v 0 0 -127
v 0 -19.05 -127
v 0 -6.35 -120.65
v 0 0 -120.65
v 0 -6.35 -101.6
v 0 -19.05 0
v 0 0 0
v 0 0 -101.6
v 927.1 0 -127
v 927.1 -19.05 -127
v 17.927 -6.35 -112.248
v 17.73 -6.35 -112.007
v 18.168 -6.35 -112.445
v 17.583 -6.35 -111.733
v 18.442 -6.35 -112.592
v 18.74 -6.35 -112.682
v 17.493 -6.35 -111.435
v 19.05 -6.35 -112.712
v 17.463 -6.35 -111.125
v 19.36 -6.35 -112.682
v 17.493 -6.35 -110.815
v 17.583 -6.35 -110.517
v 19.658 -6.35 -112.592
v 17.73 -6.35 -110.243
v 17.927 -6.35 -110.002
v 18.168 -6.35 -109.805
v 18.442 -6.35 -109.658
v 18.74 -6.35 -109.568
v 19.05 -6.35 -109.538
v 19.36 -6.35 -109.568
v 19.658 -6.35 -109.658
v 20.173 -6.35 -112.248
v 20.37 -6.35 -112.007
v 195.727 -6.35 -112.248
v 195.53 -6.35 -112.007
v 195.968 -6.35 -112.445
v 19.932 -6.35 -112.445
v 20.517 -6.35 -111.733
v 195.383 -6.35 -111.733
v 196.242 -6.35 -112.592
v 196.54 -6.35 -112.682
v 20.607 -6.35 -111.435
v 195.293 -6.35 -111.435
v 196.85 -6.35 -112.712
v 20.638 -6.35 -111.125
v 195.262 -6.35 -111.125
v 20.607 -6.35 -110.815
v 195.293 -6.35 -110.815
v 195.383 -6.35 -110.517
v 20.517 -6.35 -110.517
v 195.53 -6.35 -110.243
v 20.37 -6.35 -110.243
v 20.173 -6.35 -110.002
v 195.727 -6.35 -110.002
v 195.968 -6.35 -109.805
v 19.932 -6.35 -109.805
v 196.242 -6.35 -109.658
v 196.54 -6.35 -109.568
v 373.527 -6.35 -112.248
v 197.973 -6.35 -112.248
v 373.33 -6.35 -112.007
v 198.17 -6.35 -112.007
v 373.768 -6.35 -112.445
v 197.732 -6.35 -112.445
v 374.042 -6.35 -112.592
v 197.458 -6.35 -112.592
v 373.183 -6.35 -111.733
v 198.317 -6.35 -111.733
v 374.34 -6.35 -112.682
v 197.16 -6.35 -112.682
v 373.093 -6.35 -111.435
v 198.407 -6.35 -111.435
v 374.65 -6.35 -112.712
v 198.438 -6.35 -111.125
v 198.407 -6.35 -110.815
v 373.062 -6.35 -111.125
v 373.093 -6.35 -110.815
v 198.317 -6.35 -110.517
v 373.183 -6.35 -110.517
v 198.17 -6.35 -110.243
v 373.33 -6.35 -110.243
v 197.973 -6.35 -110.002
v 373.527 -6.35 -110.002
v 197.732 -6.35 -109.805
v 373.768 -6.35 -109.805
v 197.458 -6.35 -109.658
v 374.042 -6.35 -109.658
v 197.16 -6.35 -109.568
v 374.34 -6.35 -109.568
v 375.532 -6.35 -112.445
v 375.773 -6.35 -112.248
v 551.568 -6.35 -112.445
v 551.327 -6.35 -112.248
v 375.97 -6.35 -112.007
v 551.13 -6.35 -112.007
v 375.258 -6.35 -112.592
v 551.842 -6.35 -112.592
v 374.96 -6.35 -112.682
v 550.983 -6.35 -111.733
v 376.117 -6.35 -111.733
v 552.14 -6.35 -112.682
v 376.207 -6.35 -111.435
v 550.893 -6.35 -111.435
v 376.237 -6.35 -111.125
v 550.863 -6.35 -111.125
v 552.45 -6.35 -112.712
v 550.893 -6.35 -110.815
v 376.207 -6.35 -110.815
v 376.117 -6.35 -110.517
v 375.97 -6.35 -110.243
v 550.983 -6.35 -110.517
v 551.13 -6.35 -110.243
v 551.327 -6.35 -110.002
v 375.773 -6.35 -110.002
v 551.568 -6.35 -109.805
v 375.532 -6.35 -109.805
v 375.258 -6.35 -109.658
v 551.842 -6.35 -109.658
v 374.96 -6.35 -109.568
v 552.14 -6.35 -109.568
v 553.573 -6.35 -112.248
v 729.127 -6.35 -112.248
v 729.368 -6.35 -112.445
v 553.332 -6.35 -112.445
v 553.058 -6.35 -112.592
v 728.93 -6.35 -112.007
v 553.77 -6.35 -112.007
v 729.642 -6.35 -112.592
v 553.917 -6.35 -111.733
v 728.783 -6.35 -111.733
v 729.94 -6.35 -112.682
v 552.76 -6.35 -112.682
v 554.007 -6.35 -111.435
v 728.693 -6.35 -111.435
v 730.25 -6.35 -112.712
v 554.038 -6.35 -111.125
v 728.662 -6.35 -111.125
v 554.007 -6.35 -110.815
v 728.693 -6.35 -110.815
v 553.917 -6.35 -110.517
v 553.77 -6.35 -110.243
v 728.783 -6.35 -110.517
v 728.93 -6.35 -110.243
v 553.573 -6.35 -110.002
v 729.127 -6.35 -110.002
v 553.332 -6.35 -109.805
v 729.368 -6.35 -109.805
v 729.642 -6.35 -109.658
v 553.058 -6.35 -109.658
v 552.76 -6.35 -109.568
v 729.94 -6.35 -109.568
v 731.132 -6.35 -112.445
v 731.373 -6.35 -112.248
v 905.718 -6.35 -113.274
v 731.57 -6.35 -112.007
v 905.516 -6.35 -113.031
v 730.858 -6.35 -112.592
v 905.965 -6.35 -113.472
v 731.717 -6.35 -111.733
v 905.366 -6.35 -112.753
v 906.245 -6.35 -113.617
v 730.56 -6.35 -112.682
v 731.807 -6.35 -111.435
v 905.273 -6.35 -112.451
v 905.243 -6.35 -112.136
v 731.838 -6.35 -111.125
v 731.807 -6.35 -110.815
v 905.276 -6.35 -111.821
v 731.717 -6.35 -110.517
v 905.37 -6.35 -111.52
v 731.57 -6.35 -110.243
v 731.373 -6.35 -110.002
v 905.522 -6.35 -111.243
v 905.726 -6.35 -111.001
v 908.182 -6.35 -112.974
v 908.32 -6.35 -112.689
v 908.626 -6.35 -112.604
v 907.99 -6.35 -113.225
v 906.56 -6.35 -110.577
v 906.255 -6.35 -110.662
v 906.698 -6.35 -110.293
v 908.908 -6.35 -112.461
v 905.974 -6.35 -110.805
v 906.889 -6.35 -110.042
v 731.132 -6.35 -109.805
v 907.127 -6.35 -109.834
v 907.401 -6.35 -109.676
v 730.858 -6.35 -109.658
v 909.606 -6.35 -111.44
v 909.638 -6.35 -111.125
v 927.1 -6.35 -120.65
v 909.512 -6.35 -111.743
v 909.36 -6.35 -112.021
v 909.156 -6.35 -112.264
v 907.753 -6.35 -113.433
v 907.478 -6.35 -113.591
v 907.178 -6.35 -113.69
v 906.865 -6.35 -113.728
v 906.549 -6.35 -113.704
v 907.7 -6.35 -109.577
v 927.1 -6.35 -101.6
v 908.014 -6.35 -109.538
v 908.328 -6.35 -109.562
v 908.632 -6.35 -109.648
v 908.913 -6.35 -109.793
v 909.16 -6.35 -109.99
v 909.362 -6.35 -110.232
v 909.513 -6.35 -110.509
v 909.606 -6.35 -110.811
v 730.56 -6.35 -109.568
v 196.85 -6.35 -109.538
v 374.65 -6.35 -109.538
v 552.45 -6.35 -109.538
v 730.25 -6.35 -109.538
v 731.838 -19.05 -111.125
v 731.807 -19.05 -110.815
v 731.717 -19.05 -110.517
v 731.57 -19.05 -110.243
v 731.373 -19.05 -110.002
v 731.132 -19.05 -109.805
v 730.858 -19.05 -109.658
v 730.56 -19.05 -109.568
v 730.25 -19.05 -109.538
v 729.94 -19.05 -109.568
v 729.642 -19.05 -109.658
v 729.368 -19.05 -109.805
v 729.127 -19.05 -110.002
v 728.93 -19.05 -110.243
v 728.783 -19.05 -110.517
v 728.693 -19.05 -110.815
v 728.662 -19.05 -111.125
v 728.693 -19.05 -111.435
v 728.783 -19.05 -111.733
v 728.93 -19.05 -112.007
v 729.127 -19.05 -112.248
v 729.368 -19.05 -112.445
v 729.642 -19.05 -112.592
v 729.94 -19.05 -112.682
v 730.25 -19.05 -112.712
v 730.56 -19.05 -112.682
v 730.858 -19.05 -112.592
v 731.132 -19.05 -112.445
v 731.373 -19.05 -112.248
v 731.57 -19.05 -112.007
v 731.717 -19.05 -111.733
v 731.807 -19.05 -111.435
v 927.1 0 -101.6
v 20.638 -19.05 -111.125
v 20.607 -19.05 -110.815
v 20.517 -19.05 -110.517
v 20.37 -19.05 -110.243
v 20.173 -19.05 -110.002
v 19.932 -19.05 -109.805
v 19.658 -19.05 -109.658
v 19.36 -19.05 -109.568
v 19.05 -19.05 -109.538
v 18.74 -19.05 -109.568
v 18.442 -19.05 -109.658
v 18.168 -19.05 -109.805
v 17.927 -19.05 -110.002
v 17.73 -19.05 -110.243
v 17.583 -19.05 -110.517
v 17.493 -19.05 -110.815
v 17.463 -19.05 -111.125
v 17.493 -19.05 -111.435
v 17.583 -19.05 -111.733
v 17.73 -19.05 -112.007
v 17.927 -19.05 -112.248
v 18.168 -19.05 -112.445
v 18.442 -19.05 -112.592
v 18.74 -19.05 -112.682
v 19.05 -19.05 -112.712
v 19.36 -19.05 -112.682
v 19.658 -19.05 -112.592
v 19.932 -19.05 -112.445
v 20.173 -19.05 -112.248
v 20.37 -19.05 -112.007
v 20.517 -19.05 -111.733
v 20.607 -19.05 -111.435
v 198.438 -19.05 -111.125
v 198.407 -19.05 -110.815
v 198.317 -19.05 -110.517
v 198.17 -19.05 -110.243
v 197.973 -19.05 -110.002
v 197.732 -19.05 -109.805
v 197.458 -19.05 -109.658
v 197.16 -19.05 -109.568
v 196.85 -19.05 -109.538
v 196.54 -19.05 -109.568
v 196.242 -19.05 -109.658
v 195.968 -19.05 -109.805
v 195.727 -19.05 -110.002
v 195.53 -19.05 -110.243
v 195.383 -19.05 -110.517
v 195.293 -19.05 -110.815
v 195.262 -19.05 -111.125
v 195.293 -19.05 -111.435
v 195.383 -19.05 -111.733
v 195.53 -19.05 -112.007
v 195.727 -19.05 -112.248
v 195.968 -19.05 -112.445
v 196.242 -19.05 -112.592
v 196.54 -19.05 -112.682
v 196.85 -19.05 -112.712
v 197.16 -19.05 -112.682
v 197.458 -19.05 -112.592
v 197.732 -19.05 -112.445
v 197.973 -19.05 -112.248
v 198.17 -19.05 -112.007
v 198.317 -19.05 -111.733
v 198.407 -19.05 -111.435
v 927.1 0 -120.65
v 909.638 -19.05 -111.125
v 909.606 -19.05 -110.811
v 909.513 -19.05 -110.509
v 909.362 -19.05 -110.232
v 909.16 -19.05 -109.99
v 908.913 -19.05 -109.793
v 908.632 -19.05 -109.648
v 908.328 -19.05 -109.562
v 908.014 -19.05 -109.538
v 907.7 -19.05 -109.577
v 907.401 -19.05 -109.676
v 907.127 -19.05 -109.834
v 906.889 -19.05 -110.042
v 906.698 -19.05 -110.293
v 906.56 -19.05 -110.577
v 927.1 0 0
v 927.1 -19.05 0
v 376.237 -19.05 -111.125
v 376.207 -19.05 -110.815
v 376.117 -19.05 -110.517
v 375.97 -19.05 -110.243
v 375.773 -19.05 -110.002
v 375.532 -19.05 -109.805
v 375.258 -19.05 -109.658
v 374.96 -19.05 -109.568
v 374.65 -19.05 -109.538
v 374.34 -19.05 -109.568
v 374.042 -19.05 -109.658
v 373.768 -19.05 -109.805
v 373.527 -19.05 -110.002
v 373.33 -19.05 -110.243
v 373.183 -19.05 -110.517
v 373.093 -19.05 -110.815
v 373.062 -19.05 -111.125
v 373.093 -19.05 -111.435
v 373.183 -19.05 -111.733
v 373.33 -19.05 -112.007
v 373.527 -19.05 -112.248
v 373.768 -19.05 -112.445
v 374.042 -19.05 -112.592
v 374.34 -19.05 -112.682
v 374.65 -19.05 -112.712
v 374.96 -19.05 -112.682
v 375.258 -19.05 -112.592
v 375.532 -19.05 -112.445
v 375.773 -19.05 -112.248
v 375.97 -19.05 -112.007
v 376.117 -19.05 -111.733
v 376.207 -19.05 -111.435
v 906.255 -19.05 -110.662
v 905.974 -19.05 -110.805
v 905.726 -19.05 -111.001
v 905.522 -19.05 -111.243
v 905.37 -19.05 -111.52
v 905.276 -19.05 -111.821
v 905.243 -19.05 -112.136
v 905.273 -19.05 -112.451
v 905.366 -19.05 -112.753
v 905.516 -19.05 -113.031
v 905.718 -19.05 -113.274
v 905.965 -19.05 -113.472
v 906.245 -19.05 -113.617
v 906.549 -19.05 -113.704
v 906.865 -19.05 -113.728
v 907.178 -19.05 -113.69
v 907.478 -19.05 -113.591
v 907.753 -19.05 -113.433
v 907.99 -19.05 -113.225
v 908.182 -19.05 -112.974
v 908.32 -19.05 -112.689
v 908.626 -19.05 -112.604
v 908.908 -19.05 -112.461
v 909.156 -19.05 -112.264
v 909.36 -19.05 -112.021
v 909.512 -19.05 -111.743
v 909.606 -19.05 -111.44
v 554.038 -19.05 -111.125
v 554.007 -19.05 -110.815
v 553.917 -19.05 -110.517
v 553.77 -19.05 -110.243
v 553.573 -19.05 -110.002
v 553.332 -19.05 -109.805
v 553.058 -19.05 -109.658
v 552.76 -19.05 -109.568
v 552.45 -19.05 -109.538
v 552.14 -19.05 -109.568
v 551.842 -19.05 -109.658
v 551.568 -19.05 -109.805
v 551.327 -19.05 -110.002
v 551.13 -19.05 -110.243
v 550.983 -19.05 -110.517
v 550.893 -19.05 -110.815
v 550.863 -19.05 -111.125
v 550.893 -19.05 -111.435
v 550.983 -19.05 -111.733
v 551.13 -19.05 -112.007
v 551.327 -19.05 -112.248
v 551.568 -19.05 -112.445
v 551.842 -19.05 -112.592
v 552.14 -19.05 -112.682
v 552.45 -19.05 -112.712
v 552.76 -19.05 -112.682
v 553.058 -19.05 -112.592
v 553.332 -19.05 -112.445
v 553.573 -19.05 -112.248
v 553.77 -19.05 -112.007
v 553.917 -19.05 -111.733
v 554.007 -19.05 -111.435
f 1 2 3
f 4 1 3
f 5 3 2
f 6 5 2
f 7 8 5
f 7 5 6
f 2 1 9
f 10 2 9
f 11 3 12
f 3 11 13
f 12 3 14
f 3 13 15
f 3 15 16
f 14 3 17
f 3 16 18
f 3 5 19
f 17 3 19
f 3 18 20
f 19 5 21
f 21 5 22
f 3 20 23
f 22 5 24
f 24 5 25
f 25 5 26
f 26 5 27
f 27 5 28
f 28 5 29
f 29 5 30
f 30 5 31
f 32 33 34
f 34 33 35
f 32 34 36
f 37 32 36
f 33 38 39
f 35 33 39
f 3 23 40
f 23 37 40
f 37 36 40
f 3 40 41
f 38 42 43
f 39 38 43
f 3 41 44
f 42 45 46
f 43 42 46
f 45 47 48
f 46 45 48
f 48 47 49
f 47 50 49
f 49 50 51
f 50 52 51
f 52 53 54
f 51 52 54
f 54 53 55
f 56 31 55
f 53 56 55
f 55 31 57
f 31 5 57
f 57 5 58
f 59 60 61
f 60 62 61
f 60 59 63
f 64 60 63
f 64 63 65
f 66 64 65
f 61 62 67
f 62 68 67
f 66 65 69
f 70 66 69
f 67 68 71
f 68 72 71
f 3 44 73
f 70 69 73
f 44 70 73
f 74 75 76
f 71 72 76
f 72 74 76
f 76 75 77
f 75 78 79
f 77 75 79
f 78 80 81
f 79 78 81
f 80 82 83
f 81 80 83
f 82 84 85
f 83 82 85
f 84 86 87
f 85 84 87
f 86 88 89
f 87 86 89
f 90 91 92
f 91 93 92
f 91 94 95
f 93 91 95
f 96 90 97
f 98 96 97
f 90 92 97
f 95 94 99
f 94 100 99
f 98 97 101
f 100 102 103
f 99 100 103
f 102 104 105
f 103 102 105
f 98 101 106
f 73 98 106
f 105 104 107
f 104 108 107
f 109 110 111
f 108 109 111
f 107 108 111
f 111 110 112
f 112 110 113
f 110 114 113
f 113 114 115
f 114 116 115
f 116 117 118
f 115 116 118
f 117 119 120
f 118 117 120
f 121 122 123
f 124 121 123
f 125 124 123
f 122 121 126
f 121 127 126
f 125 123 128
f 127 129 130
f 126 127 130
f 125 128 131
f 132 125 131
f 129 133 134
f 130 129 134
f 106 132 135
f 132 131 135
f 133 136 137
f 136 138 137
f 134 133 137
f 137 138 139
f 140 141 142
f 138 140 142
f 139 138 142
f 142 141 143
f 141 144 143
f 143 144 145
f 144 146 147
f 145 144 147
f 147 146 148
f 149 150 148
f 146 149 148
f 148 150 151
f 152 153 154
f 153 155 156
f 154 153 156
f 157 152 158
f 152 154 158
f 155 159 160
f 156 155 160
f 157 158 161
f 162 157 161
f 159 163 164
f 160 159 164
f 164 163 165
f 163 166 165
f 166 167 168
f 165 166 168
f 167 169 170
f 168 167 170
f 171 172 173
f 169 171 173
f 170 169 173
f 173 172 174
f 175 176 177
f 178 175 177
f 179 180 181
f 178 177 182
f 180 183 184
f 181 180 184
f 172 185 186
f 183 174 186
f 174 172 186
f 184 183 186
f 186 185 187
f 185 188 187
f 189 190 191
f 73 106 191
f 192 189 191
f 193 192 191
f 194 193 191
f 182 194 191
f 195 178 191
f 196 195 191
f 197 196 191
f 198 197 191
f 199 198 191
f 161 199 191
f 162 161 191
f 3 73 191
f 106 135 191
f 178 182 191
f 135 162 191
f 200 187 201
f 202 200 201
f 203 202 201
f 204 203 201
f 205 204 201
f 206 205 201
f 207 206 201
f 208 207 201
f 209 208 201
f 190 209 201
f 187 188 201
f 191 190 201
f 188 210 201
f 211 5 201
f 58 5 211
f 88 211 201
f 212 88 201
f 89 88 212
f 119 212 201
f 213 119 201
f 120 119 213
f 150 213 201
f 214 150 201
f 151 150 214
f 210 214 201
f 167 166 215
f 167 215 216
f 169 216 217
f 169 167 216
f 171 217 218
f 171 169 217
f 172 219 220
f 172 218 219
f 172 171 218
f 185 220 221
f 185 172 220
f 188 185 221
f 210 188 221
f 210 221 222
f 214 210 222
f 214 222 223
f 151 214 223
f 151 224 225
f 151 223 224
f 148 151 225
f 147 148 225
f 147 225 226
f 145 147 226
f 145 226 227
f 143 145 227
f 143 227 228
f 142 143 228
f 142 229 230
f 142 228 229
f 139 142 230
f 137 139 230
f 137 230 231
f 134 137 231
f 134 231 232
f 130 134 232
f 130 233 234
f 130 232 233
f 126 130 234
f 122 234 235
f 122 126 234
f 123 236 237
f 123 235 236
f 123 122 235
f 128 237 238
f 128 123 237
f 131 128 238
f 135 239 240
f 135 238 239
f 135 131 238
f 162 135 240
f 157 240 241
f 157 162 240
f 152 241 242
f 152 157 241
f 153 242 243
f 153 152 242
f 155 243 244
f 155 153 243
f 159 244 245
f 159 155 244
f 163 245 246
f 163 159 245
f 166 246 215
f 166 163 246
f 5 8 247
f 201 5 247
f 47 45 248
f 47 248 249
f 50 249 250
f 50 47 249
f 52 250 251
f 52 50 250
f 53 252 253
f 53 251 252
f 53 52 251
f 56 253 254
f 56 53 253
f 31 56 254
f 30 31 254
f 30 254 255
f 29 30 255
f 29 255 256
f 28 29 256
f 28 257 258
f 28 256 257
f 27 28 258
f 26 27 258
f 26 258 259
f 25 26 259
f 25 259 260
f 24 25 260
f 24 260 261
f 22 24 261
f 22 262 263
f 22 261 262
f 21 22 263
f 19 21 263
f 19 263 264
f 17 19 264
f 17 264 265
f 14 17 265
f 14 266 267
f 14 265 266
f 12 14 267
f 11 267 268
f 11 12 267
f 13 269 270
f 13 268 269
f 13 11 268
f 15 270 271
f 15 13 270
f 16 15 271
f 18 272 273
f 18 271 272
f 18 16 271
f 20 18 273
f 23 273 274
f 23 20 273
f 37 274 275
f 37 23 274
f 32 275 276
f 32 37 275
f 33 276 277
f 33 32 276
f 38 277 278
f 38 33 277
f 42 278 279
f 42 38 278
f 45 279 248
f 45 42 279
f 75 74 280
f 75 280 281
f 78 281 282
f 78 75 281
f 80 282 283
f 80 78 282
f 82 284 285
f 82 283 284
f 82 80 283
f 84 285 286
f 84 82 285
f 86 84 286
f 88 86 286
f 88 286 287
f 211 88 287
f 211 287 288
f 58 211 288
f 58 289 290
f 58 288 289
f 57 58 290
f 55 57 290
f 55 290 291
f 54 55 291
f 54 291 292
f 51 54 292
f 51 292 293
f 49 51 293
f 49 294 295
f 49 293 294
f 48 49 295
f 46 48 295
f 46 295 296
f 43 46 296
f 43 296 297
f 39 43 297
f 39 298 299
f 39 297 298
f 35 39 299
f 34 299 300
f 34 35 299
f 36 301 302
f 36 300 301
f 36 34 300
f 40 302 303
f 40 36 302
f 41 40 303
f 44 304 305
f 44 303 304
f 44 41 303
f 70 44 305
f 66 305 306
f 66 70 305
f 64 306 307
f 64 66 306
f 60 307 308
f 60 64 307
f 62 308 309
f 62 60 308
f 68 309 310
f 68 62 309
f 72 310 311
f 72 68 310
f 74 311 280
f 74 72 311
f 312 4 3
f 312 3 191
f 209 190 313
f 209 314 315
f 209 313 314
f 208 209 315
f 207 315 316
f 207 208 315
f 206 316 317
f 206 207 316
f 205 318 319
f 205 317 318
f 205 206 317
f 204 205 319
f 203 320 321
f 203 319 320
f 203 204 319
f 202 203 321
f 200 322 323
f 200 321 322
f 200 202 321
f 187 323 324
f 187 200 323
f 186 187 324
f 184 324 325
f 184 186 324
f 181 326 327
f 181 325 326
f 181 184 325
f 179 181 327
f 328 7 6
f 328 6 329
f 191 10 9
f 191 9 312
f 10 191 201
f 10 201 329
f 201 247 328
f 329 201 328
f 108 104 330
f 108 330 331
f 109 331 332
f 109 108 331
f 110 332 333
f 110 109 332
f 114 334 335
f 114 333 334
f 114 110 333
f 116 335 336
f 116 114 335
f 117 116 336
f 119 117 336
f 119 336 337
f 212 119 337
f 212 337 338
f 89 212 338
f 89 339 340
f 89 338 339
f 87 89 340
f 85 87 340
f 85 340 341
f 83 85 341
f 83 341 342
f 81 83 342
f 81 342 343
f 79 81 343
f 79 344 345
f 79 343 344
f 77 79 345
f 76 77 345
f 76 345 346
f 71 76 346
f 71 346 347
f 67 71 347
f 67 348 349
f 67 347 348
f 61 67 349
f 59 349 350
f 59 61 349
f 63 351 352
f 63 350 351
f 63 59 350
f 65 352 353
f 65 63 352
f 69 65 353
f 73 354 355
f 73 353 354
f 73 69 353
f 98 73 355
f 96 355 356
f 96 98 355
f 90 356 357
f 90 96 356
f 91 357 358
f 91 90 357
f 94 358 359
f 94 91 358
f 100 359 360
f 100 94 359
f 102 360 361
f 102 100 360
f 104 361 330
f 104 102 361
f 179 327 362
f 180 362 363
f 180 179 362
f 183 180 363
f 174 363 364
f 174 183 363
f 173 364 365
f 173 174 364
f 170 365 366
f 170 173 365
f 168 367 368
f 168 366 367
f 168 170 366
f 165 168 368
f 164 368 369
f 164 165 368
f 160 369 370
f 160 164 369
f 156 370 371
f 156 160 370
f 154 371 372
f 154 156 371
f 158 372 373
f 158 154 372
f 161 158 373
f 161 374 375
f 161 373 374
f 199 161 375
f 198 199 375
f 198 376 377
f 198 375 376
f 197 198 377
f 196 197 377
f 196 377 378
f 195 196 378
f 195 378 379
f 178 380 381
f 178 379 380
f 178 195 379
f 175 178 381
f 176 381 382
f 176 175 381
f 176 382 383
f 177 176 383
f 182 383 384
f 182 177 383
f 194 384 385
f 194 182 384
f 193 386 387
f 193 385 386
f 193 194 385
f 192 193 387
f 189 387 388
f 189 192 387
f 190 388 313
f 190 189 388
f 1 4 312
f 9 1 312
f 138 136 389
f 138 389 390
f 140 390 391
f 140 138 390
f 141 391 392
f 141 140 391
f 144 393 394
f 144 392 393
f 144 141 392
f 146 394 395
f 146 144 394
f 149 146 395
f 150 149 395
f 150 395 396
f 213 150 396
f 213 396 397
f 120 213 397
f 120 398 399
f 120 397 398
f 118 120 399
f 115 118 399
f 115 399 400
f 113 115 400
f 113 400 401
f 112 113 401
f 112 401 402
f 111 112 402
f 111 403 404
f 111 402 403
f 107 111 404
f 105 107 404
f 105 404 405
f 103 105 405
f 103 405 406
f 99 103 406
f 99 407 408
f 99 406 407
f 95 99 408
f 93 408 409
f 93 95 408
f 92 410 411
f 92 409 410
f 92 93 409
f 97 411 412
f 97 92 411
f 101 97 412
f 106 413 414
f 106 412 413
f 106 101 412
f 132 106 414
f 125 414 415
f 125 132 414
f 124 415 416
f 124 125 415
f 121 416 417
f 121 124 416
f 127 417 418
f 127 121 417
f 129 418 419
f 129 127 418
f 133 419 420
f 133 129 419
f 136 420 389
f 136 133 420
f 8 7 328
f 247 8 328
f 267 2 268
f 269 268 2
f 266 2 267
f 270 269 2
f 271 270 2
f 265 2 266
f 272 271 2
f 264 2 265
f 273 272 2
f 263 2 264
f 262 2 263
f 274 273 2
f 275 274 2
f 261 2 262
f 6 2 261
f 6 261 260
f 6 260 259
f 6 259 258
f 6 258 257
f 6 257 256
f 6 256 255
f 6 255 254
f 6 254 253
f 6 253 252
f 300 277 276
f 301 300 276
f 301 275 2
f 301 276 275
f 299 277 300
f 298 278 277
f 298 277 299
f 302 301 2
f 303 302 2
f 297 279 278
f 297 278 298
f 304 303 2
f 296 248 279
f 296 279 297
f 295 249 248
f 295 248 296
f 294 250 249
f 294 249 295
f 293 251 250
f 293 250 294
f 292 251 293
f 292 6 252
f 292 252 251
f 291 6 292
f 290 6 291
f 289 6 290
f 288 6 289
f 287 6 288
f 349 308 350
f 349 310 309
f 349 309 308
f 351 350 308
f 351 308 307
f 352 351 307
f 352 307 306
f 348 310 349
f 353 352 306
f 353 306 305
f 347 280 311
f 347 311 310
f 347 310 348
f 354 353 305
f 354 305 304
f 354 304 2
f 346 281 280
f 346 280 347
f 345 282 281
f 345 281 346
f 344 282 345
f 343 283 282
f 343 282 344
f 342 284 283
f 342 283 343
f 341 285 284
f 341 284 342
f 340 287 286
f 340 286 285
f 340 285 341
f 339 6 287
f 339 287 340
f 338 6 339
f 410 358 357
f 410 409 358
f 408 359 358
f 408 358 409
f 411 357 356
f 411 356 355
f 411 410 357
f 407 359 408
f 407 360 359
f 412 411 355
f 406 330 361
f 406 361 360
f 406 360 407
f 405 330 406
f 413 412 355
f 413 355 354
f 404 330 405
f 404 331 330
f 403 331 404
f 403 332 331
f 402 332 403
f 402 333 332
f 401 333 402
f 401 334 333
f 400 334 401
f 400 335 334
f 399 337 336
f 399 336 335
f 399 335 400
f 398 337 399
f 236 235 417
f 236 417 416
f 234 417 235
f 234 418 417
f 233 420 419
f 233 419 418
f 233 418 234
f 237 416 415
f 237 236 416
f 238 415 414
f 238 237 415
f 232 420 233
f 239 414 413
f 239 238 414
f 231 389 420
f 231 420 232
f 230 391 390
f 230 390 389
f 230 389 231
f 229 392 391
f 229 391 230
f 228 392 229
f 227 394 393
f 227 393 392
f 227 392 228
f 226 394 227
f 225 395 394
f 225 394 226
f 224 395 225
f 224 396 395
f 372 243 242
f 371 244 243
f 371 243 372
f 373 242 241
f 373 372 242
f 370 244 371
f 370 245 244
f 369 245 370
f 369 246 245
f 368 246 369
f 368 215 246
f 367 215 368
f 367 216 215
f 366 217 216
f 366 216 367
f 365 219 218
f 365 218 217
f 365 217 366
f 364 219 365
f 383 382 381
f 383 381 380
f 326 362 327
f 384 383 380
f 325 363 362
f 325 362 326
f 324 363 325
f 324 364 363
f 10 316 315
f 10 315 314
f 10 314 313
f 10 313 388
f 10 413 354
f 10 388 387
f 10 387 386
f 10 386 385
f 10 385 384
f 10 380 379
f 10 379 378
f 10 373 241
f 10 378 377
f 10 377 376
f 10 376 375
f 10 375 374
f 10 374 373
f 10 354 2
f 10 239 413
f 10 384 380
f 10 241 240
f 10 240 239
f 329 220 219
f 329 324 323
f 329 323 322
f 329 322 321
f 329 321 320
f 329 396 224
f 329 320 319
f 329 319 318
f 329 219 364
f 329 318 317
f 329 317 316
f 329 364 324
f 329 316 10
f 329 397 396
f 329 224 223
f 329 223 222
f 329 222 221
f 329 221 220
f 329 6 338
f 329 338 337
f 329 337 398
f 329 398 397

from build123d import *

# Parameters (mm, degrees)
F0_W     = 927.1
F0_H     = 127
F1_DEPTH = 19.05
F2_W     = 927.1
F2_H     = 19.05
F3_DEPTH = 6.35
F4_R     = 1.5875
F5_DEPTH = 19.051


with BuildPart() as f1:
    # F0 (on Front) → F1 (new body)
    with BuildSketch(Plane.XZ):
        with Locations((463.55, -63.5)):
            Rectangle(F0_W, F0_H)
    extrude(amount=F1_DEPTH)

    # F2 (on Front) → F3 (cut)
    with BuildSketch(Plane.XZ):
        with Locations((463.55, -111.125)):
            Rectangle(F2_W, F2_H)
    extrude(amount=F3_DEPTH, mode=Mode.SUBTRACT)

    # F4 (on Front) → F5 (cut, through all)
    with BuildSketch(Plane.XZ):
        with BuildLine():
            ThreePointArc((908.3203580187, -112.6893090461), (909.264361891, -112.1474878717), (909.6375, -111.125))
            ThreePointArc((909.6375, -111.125), (908.3283195264, -109.5620878172), (906.5600896174, -110.5769823892))
            ThreePointArc((906.5600896174, -110.5769823892), (907.8529355077, -110.9269295443), (908.417947636, -112.1412914353))
            ThreePointArc((908.417947636, -112.1412914353), (908.3933598189, -112.4196109618), (908.3203580187, -112.6893090461))
        make_face()
        with BuildLine():
            ThreePointArc((908.417947636, -112.1412914353), (907.8529355077, -110.9269295443), (906.5600896174, -110.5769823892))
            ThreePointArc((906.5600896174, -110.5769823892), (906.830447636, -112.1412914353), (908.3203580187, -112.6893090461))
            ThreePointArc((908.3203580187, -112.6893090461), (908.3933598189, -112.4196109618), (908.417947636, -112.1412914353))
        make_face()
        with BuildLine():
            ThreePointArc((908.3203580187, -112.6893090461), (906.830447636, -112.1412914353), (906.5600896174, -110.5769823892))
            ThreePointArc((906.5600896174, -110.5769823892), (905.6108952721, -113.1575828707), (908.3203580187, -112.6893090461))
        make_face()
        with Locations((730.25, -111.125)):
            Circle(F4_R)
        with Locations((552.45, -111.125)):
            Circle(F4_R)
        with Locations((374.65, -111.125)):
            Circle(F4_R)
        with Locations((196.85, -111.125)):
            Circle(F4_R)
        with Locations((19.05, -111.125)):
            Circle(F4_R)
    extrude(amount=F5_DEPTH, mode=Mode.SUBTRACT)


solid = f1.part
